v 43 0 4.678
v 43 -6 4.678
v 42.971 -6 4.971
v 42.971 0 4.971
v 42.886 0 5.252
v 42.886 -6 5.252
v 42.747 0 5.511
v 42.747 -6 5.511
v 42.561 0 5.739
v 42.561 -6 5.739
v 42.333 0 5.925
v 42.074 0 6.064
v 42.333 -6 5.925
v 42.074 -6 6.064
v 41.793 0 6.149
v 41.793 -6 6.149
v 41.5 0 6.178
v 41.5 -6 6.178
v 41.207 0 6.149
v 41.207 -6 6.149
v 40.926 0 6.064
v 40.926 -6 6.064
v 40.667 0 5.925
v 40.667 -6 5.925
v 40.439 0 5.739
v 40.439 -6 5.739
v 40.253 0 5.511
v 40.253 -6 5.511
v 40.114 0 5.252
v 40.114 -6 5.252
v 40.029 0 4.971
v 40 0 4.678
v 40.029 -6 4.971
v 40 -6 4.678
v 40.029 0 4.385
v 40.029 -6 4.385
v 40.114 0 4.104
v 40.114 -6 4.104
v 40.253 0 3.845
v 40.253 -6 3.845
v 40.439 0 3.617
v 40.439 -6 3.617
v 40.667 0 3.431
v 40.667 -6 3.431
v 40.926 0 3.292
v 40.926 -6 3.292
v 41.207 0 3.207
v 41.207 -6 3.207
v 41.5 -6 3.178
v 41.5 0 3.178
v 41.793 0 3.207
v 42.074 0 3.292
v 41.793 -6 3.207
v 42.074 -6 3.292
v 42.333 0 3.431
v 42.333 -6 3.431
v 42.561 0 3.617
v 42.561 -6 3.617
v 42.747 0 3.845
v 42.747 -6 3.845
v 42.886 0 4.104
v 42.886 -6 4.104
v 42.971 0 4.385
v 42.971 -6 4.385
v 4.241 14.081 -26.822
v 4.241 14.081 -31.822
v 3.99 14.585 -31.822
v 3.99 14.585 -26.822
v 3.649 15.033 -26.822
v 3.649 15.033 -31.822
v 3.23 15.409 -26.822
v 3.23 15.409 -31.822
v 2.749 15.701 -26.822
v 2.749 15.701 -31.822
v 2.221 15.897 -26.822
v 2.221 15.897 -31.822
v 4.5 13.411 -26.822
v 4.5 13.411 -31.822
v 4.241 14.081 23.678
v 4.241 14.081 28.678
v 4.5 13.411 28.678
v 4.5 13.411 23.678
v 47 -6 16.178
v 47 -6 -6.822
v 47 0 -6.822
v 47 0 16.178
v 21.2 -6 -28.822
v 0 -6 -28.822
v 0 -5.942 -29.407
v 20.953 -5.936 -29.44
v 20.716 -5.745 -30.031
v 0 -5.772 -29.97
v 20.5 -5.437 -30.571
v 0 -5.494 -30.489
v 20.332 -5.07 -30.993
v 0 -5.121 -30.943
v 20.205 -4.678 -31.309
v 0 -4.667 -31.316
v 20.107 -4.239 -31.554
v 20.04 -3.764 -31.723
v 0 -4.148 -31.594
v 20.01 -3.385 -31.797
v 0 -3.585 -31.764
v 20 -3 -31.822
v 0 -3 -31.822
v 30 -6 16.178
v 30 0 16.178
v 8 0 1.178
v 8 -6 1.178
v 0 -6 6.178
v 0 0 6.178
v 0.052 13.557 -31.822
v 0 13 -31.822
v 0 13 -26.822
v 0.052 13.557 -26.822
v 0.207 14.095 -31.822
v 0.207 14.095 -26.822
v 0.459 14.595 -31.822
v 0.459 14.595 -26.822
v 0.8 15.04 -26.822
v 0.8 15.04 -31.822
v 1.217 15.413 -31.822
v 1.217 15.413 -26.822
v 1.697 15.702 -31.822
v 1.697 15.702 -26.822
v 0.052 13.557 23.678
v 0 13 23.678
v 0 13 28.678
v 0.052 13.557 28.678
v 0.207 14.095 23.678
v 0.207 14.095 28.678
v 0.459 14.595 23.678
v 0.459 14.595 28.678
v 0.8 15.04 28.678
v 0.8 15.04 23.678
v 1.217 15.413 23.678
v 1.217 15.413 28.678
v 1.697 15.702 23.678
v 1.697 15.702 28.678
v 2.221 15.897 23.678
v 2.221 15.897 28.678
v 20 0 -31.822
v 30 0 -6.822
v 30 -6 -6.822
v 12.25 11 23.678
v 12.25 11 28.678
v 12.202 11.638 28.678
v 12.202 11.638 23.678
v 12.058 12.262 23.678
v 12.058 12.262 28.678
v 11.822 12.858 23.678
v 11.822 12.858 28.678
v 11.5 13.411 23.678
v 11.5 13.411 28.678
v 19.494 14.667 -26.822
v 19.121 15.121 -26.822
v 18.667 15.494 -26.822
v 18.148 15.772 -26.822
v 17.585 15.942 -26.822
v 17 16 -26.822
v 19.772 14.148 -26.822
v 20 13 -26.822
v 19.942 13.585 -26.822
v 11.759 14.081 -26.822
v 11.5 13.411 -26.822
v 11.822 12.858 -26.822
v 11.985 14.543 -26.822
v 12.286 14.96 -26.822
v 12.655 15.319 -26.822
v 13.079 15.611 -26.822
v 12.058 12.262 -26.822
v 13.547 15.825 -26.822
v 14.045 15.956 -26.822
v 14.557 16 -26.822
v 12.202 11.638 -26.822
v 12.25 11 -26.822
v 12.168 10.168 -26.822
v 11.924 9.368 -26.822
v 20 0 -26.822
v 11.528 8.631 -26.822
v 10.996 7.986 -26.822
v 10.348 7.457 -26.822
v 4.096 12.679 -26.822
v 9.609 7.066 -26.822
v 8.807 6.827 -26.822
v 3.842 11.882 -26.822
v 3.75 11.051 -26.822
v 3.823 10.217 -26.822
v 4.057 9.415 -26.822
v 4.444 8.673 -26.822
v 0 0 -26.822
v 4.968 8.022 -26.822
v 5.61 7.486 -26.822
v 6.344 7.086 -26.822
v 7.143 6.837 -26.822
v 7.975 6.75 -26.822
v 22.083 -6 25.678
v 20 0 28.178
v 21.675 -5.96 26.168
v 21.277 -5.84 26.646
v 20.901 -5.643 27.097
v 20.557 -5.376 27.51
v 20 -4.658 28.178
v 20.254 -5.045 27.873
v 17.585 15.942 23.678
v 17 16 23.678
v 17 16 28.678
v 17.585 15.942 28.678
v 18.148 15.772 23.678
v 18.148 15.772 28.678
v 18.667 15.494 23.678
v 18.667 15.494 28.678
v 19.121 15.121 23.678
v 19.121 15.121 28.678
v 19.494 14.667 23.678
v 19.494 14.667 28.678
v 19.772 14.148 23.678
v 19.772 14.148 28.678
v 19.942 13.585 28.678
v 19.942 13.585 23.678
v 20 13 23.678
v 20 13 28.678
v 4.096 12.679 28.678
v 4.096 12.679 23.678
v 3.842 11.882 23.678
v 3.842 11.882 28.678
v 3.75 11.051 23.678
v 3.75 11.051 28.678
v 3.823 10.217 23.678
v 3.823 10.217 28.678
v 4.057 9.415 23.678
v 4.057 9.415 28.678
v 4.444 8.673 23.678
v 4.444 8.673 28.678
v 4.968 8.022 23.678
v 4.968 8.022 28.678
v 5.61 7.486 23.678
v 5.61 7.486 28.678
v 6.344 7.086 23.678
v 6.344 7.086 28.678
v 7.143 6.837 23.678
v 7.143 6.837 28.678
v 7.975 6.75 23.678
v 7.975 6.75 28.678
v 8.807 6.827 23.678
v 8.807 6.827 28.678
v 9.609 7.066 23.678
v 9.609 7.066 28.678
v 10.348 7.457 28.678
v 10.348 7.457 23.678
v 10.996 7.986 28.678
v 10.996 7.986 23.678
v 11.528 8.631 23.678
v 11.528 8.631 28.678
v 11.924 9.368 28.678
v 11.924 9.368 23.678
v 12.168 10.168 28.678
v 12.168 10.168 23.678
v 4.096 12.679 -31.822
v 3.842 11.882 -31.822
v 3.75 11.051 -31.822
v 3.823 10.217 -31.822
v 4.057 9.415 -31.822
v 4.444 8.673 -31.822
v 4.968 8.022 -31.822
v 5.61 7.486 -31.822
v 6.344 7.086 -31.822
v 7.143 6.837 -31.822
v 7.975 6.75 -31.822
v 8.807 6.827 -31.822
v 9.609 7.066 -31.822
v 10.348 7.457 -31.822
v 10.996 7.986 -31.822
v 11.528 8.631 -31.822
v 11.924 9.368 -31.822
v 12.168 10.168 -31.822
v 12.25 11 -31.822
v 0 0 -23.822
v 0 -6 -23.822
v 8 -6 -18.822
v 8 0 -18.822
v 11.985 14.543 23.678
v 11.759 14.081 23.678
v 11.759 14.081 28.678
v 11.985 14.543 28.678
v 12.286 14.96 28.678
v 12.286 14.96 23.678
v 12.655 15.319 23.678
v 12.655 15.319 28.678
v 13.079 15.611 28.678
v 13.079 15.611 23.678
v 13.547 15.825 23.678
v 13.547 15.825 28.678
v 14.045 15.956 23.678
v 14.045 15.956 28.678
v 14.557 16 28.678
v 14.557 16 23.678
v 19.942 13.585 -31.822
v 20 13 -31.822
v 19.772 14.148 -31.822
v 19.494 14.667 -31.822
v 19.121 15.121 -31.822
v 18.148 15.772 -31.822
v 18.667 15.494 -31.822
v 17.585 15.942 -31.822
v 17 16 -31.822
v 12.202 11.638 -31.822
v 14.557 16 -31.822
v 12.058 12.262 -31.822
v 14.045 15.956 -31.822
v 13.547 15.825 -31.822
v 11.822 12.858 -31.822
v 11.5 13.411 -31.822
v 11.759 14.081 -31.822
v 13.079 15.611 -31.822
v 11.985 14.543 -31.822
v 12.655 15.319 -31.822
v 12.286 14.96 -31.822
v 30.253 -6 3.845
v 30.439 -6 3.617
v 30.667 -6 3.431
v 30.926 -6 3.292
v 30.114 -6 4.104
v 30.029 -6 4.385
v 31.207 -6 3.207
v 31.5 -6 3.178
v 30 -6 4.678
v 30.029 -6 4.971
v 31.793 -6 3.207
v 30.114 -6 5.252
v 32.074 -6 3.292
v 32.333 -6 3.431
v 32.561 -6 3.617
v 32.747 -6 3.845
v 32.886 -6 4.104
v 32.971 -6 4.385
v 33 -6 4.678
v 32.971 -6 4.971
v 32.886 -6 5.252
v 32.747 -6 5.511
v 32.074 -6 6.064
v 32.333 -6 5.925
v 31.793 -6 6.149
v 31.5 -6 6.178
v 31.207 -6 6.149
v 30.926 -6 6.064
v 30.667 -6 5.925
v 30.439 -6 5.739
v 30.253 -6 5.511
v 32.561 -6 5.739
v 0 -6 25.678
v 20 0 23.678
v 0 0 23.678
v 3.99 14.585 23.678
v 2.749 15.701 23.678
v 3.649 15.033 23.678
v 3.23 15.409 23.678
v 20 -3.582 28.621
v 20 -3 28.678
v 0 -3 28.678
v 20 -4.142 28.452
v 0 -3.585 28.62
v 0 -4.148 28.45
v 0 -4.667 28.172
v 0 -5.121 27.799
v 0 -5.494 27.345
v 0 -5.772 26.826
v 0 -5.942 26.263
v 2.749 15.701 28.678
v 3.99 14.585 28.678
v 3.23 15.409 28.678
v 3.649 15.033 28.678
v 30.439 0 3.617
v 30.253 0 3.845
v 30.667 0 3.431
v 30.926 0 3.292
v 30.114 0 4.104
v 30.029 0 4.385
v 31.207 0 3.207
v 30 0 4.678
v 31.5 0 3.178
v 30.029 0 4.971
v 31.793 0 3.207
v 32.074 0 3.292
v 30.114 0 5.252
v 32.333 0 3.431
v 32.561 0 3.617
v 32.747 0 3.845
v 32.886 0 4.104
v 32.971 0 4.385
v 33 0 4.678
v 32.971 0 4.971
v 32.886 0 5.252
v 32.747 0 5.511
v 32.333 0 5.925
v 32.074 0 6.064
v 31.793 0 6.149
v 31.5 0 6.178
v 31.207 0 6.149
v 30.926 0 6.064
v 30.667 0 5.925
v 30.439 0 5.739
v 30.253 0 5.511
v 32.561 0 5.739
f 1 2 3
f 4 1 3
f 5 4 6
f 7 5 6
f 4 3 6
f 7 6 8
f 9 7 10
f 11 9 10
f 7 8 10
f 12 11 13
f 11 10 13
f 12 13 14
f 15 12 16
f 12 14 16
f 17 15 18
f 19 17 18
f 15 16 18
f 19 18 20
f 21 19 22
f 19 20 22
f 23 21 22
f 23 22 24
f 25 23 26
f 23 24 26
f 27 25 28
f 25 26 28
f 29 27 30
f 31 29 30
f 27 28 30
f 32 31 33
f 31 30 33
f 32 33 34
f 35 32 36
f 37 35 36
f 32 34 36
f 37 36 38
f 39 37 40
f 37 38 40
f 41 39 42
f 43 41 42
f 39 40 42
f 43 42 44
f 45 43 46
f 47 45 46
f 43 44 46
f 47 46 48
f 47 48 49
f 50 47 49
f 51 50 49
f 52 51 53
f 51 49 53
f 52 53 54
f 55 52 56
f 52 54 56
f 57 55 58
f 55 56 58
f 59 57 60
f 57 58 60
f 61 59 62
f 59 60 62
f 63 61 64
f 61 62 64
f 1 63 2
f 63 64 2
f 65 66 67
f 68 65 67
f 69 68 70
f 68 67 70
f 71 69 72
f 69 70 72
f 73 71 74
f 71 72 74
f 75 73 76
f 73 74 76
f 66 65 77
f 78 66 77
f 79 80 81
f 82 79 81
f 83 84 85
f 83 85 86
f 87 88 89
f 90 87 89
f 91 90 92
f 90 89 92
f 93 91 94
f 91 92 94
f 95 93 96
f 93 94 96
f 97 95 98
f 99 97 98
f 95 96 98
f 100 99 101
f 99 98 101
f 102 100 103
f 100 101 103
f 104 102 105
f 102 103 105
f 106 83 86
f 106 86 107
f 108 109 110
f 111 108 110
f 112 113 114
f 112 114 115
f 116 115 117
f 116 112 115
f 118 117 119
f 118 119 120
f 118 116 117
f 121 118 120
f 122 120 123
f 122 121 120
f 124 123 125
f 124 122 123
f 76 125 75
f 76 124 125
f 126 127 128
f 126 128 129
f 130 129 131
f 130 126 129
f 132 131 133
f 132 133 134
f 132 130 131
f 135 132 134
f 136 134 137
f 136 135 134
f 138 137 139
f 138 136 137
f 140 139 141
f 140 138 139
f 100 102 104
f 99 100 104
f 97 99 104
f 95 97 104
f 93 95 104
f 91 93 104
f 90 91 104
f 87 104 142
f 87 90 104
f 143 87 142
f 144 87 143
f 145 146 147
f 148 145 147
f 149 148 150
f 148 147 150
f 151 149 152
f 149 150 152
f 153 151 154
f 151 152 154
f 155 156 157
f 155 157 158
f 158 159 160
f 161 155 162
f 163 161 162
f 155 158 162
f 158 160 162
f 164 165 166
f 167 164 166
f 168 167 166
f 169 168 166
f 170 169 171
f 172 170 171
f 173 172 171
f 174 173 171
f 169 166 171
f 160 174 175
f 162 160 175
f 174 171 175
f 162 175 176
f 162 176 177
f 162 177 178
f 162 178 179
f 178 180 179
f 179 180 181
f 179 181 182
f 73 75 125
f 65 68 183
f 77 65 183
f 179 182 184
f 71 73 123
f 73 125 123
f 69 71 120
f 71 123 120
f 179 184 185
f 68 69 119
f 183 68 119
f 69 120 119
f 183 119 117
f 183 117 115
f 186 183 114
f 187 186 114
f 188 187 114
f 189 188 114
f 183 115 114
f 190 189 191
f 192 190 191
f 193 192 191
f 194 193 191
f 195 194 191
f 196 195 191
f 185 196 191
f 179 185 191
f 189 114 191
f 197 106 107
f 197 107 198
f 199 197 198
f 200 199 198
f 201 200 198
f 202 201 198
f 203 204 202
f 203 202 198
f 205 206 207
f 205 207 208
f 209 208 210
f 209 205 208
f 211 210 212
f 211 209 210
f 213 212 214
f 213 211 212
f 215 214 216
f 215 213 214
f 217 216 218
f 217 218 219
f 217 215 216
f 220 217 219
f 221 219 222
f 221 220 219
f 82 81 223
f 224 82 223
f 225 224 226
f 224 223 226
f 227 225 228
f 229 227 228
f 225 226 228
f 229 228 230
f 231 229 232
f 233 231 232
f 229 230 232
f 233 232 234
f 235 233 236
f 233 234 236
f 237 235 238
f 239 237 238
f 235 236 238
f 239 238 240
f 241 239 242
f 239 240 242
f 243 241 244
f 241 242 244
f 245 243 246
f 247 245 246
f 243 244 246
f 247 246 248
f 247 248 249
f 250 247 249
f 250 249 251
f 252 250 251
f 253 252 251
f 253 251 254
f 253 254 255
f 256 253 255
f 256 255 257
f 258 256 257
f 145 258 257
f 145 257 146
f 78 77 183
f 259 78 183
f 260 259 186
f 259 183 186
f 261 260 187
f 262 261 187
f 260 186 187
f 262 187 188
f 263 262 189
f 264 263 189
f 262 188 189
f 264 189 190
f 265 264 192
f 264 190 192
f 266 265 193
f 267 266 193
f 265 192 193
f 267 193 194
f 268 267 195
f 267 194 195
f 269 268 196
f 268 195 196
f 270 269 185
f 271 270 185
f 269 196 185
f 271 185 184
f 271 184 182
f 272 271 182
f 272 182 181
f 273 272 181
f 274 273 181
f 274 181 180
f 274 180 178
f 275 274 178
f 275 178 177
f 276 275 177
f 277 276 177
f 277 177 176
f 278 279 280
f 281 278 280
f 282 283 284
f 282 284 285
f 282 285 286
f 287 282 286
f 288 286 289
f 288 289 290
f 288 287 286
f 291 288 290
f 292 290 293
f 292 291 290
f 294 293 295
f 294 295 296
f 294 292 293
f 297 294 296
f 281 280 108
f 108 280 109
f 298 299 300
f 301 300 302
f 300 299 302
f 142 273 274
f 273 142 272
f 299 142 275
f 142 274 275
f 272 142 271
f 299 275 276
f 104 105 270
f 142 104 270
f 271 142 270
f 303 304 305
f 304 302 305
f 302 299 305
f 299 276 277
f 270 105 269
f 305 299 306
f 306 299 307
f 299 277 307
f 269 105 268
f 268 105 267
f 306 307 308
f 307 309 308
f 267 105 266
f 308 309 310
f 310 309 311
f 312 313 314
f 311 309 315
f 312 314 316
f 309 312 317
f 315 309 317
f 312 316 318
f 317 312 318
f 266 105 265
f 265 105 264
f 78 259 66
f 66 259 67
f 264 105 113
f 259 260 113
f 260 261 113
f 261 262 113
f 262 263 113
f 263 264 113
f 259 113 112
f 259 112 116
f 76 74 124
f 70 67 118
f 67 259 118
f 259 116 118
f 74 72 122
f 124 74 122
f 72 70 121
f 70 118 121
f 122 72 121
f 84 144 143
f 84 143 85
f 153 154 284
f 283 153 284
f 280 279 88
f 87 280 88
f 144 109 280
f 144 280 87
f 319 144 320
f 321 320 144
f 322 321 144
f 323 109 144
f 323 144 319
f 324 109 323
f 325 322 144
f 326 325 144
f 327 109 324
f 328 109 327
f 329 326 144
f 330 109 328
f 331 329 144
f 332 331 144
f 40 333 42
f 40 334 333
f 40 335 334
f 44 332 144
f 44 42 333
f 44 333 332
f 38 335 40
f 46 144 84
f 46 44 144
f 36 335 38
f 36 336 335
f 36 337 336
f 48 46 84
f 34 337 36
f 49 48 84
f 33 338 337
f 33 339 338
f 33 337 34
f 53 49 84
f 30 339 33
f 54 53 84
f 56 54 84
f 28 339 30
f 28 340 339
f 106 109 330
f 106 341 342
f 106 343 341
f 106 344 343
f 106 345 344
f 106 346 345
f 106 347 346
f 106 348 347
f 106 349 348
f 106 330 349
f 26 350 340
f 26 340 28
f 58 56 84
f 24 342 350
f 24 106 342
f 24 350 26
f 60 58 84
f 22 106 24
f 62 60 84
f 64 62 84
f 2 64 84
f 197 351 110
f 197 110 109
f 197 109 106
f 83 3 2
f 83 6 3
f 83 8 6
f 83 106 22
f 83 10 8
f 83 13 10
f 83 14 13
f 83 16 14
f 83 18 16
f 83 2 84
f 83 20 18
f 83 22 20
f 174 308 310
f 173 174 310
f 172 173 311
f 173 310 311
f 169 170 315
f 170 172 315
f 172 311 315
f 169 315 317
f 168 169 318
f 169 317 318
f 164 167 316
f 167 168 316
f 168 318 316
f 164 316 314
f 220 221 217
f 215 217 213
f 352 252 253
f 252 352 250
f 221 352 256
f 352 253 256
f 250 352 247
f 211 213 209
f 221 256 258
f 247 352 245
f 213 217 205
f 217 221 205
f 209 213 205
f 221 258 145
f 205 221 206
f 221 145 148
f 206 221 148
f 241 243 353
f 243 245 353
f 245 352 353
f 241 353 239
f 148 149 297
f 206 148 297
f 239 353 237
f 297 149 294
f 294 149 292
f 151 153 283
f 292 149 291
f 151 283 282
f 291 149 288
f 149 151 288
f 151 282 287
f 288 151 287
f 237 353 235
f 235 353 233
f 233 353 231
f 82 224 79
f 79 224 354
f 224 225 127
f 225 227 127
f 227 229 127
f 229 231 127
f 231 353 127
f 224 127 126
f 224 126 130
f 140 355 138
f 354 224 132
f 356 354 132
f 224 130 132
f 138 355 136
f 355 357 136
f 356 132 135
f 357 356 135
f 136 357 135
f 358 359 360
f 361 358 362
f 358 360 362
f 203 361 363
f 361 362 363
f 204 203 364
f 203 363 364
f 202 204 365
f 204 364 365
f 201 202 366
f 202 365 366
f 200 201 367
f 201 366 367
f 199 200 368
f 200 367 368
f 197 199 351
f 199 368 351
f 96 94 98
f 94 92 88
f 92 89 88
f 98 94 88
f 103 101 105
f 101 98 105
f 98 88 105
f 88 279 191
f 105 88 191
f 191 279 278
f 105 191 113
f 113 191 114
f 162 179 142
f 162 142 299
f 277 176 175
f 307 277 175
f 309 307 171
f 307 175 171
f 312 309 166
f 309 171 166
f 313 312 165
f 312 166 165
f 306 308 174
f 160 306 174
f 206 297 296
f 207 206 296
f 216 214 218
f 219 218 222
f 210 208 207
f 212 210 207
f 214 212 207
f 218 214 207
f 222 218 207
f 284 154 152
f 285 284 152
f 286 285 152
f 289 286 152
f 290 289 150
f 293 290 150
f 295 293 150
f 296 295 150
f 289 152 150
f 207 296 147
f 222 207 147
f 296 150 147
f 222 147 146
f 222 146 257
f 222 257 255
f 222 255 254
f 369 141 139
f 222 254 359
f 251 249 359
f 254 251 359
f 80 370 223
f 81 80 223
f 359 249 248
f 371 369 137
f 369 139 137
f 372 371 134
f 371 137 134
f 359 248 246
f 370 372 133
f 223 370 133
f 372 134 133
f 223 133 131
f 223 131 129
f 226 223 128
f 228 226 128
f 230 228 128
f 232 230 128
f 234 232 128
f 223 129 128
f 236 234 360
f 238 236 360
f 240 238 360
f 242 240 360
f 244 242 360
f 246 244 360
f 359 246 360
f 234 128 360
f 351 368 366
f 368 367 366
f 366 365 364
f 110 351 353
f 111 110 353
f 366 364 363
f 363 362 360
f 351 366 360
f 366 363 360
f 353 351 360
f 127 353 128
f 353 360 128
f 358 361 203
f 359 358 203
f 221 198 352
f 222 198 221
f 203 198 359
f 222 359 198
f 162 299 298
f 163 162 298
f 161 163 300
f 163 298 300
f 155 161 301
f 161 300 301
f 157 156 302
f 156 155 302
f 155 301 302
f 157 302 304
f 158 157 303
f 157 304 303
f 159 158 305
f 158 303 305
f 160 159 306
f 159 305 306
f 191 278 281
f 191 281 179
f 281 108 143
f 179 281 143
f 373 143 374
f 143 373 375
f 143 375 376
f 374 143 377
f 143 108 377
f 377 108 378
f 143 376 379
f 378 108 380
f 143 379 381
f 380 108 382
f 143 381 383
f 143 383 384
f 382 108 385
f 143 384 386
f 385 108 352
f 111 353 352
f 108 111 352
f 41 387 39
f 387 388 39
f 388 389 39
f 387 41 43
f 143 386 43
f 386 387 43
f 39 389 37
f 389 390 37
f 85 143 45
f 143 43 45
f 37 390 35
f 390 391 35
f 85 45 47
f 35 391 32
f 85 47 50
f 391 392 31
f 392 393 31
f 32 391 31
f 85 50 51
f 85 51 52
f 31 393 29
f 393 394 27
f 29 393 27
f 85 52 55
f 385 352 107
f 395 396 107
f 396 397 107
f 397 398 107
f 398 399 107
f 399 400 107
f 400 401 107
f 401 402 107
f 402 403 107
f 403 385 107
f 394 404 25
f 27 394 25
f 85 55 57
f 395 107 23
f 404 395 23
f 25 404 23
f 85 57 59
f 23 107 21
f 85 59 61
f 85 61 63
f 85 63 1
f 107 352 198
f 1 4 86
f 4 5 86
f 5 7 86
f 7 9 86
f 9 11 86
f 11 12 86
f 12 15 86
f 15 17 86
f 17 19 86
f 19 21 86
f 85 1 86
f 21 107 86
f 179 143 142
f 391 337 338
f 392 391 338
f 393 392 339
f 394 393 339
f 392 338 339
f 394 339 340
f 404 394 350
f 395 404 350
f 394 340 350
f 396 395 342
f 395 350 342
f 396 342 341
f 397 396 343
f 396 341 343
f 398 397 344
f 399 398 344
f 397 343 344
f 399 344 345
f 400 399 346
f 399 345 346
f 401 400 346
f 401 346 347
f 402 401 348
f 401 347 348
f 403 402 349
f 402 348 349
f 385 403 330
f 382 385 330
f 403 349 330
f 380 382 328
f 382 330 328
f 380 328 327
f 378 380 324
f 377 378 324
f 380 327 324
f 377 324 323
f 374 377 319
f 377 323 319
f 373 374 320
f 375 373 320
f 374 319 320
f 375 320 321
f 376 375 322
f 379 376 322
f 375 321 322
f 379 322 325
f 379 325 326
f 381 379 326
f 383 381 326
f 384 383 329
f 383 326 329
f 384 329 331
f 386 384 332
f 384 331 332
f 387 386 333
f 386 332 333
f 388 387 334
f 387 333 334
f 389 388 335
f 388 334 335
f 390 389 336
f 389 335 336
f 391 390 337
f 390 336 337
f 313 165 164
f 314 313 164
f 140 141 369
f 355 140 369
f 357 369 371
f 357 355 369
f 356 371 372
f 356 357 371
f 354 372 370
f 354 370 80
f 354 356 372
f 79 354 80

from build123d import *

# Parameters (mm, degrees)
F1_DEPTH    = 20
F3_DEPTH    = 70
F4_R        = 1.5
F5_DEPTH    = 6
F6_T1_DEPTH = 20
F6_T3_DEPTH = 20
F6_T5_DEPTH = 15.2864150343
F6_T7_DEPTH = 15.2864150343
F6_T9_DEPTH = 35
F8_DEPTH    = 25
F9_DEPTH    = 25


# Not quite as in the source:
# - a fillet or chamfer that OpenCascade refuses, or shapes differently, is made with other operations: its cross-section is extruded or revolved along the edge and cut away or added


with BuildPart() as f1:
    # F0 (on Right) → F1 (new body)
    with BuildSketch(Plane.YZ):
        Polygon((0, -26.8219177697), (0, 23.6780822303), (16, 23.6780822303), (16, 28.6780822303), (-6, 28.6780822303), (-6, -31.8219177697), (16, -31.8219177697), (16, -26.8219177697), align=None)
    extrude(amount=F1_DEPTH)

    # F2 (on face) → F3 (cut)
    with BuildSketch(Plane.XY.offset(28.6780822303)):
        with BuildLine():
            ThreePointArc((4.5, 13.4109126902), (6.7375618827, 6.9418292298), (12.25, 11))
            ThreePointArc((12.25, 11), (12.0581707702, 12.2624381173), (11.5, 13.4109126902))
            ThreePointArc((11.5, 13.4109126902), (8, 15.25), (4.5, 13.4109126902))
        make_face()
        with BuildLine():
            ThreePointArc((4.5, 13.4109126902), (8, 15.25), (11.5, 13.4109126902))
            Line((11.5, 13.4109126902), (12.5, 16))
            Line((12.5, 16), (3.5, 16))
            Line((3.5, 16), (4.5, 13.4109126902))
        make_face()
    extrude(amount=-F3_DEPTH, mode=Mode.SUBTRACT)

    # F4 (on face) → F5 (join)
    with BuildSketch(Plane.XZ.offset(6)):
        Polygon((20, 16.1780822303), (20, -6.8219177697), (30, -6.8219177697), (47, -6.8219177697), (47, 16.1780822303), (30, 16.1780822303), align=None)
        with Locations((31.5, 4.6780822303)):
            Circle(F4_R, mode=Mode.SUBTRACT)
        with Locations((41.5, 4.6780822303)):
            Circle(F4_R, mode=Mode.SUBTRACT)
        Polygon((30, -6.8219177697), (20, -6.8219177697), (20, -31.8219177697), align=None)
        Polygon((20, 28.1780822303), (20, 16.1780822303), (30, 16.1780822303), align=None)
    extrude(amount=-F5_DEPTH)

    # F6: fillet of radius 3 on 10 edges, made by hand

    # F6_s2 → F6_t1 (cut)
    with BuildSketch(Plane.XY.offset(16.1780822303)):
        with BuildLine():
            ThreePointArc((17, 16), (19.1213203436, 15.1213203436), (20, 13))
            Line((20, 13), (20, 16))
            Line((20, 16), (17, 16))
        make_face()
        with BuildLine():
            ThreePointArc((0, 13), (0.8786796564, 15.1213203436), (3, 16))
            Line((3, 16), (0, 16))
            Line((0, 16), (0, 13))
        make_face()
    extrude(amount=F6_T1_DEPTH, mode=Mode.SUBTRACT)

    # F6_s4 → F6_t3 (cut)
    with BuildSketch(Plane.XY.offset(-39.3219177697)):
        with BuildLine():
            ThreePointArc((20, 13), (19.1213203436, 15.1213203436), (17, 16))
            Line((17, 16), (20, 16))
            Line((20, 16), (20, 13))
        make_face()
        with BuildLine():
            ThreePointArc((0, 13), (0.8786796564, 15.1213203436), (3, 16))
            Line((3, 16), (0, 16))
            Line((0, 16), (0, 13))
        make_face()
    extrude(amount=F6_T3_DEPTH, mode=Mode.SUBTRACT)

    # F6_s6 → F6_t5 (cut)
    with BuildSketch(Plane.XY.offset(18.5348747132)):
        with BuildLine():
            ThreePointArc((11.7587690029, 14.0808882317), (12.8606193241, 15.4741326455), (14.5572830069, 16))
            Line((14.5572830069, 16), (12.5, 16))
            Line((12.5, 16), (11.7587690029, 14.0808882317))
        make_face()
        with BuildLine():
            ThreePointArc((1.4427169931, 16), (3.1393806759, 15.4741326455), (4.2412309971, 14.0808882317))
            Line((4.2412309971, 14.0808882317), (3.5, 16))
            Line((3.5, 16), (1.4427169931, 16))
        make_face()
    extrude(amount=F6_T5_DEPTH, mode=Mode.SUBTRACT)

    # F6_s8 → F6_t7 (cut)
    with BuildSketch(Plane.XY.offset(-36.9651252868)):
        with BuildLine():
            ThreePointArc((14.5572830069, 16), (12.8606193241, 15.4741326455), (11.7587690029, 14.0808882317))
            Line((11.7587690029, 14.0808882317), (12.5, 16))
            Line((12.5, 16), (14.5572830069, 16))
        make_face()
        with BuildLine():
            ThreePointArc((4.2412309971, 14.0808882317), (3.1393806759, 15.4741326455), (1.4427169931, 16))
            Line((1.4427169931, 16), (3.5, 16))
            Line((3.5, 16), (4.2412309971, 14.0808882317))
        make_face()
    extrude(amount=F6_T7_DEPTH, mode=Mode.SUBTRACT)

    # F6_s10 → F6_t9 (cut)
    with BuildSketch(Plane.YZ.offset(-7.5)):
        with BuildLine():
            ThreePointArc((-3, 28.6780822303), (-5.1213203436, 27.7994025739), (-6, 25.6780822303))
            Line((-6, 25.6780822303), (-6, 28.6780822303))
            Line((-6, 28.6780822303), (-3, 28.6780822303))
        make_face()
        with BuildLine():
            ThreePointArc((-6, -28.8219177697), (-5.1213203436, -30.9432381132), (-3, -31.8219177697))
            Line((-3, -31.8219177697), (-6, -31.8219177697))
            Line((-6, -31.8219177697), (-6, -28.8219177697))
        make_face()
    extrude(amount=F6_T9_DEPTH, mode=Mode.SUBTRACT)

    # F7 (on face) → F8 (cut)
    with BuildSketch(Plane.XZ.offset(6)):
        Polygon((0, 6.1780822303), (0, -23.8219177697), (8, -18.8219177697), (8, 1.1780822303), align=None)
    extrude(amount=-F8_DEPTH, mode=Mode.SUBTRACT)

    # F7 (on face) → F9 (cut)
    with BuildSketch(Plane.XZ.offset(6)):
        Polygon((0, 6.1780822303), (0, -23.8219177697), (8, -18.8219177697), (8, 1.1780822303), align=None)
    extrude(amount=-F9_DEPTH, mode=Mode.SUBTRACT)


solid = f1.part
